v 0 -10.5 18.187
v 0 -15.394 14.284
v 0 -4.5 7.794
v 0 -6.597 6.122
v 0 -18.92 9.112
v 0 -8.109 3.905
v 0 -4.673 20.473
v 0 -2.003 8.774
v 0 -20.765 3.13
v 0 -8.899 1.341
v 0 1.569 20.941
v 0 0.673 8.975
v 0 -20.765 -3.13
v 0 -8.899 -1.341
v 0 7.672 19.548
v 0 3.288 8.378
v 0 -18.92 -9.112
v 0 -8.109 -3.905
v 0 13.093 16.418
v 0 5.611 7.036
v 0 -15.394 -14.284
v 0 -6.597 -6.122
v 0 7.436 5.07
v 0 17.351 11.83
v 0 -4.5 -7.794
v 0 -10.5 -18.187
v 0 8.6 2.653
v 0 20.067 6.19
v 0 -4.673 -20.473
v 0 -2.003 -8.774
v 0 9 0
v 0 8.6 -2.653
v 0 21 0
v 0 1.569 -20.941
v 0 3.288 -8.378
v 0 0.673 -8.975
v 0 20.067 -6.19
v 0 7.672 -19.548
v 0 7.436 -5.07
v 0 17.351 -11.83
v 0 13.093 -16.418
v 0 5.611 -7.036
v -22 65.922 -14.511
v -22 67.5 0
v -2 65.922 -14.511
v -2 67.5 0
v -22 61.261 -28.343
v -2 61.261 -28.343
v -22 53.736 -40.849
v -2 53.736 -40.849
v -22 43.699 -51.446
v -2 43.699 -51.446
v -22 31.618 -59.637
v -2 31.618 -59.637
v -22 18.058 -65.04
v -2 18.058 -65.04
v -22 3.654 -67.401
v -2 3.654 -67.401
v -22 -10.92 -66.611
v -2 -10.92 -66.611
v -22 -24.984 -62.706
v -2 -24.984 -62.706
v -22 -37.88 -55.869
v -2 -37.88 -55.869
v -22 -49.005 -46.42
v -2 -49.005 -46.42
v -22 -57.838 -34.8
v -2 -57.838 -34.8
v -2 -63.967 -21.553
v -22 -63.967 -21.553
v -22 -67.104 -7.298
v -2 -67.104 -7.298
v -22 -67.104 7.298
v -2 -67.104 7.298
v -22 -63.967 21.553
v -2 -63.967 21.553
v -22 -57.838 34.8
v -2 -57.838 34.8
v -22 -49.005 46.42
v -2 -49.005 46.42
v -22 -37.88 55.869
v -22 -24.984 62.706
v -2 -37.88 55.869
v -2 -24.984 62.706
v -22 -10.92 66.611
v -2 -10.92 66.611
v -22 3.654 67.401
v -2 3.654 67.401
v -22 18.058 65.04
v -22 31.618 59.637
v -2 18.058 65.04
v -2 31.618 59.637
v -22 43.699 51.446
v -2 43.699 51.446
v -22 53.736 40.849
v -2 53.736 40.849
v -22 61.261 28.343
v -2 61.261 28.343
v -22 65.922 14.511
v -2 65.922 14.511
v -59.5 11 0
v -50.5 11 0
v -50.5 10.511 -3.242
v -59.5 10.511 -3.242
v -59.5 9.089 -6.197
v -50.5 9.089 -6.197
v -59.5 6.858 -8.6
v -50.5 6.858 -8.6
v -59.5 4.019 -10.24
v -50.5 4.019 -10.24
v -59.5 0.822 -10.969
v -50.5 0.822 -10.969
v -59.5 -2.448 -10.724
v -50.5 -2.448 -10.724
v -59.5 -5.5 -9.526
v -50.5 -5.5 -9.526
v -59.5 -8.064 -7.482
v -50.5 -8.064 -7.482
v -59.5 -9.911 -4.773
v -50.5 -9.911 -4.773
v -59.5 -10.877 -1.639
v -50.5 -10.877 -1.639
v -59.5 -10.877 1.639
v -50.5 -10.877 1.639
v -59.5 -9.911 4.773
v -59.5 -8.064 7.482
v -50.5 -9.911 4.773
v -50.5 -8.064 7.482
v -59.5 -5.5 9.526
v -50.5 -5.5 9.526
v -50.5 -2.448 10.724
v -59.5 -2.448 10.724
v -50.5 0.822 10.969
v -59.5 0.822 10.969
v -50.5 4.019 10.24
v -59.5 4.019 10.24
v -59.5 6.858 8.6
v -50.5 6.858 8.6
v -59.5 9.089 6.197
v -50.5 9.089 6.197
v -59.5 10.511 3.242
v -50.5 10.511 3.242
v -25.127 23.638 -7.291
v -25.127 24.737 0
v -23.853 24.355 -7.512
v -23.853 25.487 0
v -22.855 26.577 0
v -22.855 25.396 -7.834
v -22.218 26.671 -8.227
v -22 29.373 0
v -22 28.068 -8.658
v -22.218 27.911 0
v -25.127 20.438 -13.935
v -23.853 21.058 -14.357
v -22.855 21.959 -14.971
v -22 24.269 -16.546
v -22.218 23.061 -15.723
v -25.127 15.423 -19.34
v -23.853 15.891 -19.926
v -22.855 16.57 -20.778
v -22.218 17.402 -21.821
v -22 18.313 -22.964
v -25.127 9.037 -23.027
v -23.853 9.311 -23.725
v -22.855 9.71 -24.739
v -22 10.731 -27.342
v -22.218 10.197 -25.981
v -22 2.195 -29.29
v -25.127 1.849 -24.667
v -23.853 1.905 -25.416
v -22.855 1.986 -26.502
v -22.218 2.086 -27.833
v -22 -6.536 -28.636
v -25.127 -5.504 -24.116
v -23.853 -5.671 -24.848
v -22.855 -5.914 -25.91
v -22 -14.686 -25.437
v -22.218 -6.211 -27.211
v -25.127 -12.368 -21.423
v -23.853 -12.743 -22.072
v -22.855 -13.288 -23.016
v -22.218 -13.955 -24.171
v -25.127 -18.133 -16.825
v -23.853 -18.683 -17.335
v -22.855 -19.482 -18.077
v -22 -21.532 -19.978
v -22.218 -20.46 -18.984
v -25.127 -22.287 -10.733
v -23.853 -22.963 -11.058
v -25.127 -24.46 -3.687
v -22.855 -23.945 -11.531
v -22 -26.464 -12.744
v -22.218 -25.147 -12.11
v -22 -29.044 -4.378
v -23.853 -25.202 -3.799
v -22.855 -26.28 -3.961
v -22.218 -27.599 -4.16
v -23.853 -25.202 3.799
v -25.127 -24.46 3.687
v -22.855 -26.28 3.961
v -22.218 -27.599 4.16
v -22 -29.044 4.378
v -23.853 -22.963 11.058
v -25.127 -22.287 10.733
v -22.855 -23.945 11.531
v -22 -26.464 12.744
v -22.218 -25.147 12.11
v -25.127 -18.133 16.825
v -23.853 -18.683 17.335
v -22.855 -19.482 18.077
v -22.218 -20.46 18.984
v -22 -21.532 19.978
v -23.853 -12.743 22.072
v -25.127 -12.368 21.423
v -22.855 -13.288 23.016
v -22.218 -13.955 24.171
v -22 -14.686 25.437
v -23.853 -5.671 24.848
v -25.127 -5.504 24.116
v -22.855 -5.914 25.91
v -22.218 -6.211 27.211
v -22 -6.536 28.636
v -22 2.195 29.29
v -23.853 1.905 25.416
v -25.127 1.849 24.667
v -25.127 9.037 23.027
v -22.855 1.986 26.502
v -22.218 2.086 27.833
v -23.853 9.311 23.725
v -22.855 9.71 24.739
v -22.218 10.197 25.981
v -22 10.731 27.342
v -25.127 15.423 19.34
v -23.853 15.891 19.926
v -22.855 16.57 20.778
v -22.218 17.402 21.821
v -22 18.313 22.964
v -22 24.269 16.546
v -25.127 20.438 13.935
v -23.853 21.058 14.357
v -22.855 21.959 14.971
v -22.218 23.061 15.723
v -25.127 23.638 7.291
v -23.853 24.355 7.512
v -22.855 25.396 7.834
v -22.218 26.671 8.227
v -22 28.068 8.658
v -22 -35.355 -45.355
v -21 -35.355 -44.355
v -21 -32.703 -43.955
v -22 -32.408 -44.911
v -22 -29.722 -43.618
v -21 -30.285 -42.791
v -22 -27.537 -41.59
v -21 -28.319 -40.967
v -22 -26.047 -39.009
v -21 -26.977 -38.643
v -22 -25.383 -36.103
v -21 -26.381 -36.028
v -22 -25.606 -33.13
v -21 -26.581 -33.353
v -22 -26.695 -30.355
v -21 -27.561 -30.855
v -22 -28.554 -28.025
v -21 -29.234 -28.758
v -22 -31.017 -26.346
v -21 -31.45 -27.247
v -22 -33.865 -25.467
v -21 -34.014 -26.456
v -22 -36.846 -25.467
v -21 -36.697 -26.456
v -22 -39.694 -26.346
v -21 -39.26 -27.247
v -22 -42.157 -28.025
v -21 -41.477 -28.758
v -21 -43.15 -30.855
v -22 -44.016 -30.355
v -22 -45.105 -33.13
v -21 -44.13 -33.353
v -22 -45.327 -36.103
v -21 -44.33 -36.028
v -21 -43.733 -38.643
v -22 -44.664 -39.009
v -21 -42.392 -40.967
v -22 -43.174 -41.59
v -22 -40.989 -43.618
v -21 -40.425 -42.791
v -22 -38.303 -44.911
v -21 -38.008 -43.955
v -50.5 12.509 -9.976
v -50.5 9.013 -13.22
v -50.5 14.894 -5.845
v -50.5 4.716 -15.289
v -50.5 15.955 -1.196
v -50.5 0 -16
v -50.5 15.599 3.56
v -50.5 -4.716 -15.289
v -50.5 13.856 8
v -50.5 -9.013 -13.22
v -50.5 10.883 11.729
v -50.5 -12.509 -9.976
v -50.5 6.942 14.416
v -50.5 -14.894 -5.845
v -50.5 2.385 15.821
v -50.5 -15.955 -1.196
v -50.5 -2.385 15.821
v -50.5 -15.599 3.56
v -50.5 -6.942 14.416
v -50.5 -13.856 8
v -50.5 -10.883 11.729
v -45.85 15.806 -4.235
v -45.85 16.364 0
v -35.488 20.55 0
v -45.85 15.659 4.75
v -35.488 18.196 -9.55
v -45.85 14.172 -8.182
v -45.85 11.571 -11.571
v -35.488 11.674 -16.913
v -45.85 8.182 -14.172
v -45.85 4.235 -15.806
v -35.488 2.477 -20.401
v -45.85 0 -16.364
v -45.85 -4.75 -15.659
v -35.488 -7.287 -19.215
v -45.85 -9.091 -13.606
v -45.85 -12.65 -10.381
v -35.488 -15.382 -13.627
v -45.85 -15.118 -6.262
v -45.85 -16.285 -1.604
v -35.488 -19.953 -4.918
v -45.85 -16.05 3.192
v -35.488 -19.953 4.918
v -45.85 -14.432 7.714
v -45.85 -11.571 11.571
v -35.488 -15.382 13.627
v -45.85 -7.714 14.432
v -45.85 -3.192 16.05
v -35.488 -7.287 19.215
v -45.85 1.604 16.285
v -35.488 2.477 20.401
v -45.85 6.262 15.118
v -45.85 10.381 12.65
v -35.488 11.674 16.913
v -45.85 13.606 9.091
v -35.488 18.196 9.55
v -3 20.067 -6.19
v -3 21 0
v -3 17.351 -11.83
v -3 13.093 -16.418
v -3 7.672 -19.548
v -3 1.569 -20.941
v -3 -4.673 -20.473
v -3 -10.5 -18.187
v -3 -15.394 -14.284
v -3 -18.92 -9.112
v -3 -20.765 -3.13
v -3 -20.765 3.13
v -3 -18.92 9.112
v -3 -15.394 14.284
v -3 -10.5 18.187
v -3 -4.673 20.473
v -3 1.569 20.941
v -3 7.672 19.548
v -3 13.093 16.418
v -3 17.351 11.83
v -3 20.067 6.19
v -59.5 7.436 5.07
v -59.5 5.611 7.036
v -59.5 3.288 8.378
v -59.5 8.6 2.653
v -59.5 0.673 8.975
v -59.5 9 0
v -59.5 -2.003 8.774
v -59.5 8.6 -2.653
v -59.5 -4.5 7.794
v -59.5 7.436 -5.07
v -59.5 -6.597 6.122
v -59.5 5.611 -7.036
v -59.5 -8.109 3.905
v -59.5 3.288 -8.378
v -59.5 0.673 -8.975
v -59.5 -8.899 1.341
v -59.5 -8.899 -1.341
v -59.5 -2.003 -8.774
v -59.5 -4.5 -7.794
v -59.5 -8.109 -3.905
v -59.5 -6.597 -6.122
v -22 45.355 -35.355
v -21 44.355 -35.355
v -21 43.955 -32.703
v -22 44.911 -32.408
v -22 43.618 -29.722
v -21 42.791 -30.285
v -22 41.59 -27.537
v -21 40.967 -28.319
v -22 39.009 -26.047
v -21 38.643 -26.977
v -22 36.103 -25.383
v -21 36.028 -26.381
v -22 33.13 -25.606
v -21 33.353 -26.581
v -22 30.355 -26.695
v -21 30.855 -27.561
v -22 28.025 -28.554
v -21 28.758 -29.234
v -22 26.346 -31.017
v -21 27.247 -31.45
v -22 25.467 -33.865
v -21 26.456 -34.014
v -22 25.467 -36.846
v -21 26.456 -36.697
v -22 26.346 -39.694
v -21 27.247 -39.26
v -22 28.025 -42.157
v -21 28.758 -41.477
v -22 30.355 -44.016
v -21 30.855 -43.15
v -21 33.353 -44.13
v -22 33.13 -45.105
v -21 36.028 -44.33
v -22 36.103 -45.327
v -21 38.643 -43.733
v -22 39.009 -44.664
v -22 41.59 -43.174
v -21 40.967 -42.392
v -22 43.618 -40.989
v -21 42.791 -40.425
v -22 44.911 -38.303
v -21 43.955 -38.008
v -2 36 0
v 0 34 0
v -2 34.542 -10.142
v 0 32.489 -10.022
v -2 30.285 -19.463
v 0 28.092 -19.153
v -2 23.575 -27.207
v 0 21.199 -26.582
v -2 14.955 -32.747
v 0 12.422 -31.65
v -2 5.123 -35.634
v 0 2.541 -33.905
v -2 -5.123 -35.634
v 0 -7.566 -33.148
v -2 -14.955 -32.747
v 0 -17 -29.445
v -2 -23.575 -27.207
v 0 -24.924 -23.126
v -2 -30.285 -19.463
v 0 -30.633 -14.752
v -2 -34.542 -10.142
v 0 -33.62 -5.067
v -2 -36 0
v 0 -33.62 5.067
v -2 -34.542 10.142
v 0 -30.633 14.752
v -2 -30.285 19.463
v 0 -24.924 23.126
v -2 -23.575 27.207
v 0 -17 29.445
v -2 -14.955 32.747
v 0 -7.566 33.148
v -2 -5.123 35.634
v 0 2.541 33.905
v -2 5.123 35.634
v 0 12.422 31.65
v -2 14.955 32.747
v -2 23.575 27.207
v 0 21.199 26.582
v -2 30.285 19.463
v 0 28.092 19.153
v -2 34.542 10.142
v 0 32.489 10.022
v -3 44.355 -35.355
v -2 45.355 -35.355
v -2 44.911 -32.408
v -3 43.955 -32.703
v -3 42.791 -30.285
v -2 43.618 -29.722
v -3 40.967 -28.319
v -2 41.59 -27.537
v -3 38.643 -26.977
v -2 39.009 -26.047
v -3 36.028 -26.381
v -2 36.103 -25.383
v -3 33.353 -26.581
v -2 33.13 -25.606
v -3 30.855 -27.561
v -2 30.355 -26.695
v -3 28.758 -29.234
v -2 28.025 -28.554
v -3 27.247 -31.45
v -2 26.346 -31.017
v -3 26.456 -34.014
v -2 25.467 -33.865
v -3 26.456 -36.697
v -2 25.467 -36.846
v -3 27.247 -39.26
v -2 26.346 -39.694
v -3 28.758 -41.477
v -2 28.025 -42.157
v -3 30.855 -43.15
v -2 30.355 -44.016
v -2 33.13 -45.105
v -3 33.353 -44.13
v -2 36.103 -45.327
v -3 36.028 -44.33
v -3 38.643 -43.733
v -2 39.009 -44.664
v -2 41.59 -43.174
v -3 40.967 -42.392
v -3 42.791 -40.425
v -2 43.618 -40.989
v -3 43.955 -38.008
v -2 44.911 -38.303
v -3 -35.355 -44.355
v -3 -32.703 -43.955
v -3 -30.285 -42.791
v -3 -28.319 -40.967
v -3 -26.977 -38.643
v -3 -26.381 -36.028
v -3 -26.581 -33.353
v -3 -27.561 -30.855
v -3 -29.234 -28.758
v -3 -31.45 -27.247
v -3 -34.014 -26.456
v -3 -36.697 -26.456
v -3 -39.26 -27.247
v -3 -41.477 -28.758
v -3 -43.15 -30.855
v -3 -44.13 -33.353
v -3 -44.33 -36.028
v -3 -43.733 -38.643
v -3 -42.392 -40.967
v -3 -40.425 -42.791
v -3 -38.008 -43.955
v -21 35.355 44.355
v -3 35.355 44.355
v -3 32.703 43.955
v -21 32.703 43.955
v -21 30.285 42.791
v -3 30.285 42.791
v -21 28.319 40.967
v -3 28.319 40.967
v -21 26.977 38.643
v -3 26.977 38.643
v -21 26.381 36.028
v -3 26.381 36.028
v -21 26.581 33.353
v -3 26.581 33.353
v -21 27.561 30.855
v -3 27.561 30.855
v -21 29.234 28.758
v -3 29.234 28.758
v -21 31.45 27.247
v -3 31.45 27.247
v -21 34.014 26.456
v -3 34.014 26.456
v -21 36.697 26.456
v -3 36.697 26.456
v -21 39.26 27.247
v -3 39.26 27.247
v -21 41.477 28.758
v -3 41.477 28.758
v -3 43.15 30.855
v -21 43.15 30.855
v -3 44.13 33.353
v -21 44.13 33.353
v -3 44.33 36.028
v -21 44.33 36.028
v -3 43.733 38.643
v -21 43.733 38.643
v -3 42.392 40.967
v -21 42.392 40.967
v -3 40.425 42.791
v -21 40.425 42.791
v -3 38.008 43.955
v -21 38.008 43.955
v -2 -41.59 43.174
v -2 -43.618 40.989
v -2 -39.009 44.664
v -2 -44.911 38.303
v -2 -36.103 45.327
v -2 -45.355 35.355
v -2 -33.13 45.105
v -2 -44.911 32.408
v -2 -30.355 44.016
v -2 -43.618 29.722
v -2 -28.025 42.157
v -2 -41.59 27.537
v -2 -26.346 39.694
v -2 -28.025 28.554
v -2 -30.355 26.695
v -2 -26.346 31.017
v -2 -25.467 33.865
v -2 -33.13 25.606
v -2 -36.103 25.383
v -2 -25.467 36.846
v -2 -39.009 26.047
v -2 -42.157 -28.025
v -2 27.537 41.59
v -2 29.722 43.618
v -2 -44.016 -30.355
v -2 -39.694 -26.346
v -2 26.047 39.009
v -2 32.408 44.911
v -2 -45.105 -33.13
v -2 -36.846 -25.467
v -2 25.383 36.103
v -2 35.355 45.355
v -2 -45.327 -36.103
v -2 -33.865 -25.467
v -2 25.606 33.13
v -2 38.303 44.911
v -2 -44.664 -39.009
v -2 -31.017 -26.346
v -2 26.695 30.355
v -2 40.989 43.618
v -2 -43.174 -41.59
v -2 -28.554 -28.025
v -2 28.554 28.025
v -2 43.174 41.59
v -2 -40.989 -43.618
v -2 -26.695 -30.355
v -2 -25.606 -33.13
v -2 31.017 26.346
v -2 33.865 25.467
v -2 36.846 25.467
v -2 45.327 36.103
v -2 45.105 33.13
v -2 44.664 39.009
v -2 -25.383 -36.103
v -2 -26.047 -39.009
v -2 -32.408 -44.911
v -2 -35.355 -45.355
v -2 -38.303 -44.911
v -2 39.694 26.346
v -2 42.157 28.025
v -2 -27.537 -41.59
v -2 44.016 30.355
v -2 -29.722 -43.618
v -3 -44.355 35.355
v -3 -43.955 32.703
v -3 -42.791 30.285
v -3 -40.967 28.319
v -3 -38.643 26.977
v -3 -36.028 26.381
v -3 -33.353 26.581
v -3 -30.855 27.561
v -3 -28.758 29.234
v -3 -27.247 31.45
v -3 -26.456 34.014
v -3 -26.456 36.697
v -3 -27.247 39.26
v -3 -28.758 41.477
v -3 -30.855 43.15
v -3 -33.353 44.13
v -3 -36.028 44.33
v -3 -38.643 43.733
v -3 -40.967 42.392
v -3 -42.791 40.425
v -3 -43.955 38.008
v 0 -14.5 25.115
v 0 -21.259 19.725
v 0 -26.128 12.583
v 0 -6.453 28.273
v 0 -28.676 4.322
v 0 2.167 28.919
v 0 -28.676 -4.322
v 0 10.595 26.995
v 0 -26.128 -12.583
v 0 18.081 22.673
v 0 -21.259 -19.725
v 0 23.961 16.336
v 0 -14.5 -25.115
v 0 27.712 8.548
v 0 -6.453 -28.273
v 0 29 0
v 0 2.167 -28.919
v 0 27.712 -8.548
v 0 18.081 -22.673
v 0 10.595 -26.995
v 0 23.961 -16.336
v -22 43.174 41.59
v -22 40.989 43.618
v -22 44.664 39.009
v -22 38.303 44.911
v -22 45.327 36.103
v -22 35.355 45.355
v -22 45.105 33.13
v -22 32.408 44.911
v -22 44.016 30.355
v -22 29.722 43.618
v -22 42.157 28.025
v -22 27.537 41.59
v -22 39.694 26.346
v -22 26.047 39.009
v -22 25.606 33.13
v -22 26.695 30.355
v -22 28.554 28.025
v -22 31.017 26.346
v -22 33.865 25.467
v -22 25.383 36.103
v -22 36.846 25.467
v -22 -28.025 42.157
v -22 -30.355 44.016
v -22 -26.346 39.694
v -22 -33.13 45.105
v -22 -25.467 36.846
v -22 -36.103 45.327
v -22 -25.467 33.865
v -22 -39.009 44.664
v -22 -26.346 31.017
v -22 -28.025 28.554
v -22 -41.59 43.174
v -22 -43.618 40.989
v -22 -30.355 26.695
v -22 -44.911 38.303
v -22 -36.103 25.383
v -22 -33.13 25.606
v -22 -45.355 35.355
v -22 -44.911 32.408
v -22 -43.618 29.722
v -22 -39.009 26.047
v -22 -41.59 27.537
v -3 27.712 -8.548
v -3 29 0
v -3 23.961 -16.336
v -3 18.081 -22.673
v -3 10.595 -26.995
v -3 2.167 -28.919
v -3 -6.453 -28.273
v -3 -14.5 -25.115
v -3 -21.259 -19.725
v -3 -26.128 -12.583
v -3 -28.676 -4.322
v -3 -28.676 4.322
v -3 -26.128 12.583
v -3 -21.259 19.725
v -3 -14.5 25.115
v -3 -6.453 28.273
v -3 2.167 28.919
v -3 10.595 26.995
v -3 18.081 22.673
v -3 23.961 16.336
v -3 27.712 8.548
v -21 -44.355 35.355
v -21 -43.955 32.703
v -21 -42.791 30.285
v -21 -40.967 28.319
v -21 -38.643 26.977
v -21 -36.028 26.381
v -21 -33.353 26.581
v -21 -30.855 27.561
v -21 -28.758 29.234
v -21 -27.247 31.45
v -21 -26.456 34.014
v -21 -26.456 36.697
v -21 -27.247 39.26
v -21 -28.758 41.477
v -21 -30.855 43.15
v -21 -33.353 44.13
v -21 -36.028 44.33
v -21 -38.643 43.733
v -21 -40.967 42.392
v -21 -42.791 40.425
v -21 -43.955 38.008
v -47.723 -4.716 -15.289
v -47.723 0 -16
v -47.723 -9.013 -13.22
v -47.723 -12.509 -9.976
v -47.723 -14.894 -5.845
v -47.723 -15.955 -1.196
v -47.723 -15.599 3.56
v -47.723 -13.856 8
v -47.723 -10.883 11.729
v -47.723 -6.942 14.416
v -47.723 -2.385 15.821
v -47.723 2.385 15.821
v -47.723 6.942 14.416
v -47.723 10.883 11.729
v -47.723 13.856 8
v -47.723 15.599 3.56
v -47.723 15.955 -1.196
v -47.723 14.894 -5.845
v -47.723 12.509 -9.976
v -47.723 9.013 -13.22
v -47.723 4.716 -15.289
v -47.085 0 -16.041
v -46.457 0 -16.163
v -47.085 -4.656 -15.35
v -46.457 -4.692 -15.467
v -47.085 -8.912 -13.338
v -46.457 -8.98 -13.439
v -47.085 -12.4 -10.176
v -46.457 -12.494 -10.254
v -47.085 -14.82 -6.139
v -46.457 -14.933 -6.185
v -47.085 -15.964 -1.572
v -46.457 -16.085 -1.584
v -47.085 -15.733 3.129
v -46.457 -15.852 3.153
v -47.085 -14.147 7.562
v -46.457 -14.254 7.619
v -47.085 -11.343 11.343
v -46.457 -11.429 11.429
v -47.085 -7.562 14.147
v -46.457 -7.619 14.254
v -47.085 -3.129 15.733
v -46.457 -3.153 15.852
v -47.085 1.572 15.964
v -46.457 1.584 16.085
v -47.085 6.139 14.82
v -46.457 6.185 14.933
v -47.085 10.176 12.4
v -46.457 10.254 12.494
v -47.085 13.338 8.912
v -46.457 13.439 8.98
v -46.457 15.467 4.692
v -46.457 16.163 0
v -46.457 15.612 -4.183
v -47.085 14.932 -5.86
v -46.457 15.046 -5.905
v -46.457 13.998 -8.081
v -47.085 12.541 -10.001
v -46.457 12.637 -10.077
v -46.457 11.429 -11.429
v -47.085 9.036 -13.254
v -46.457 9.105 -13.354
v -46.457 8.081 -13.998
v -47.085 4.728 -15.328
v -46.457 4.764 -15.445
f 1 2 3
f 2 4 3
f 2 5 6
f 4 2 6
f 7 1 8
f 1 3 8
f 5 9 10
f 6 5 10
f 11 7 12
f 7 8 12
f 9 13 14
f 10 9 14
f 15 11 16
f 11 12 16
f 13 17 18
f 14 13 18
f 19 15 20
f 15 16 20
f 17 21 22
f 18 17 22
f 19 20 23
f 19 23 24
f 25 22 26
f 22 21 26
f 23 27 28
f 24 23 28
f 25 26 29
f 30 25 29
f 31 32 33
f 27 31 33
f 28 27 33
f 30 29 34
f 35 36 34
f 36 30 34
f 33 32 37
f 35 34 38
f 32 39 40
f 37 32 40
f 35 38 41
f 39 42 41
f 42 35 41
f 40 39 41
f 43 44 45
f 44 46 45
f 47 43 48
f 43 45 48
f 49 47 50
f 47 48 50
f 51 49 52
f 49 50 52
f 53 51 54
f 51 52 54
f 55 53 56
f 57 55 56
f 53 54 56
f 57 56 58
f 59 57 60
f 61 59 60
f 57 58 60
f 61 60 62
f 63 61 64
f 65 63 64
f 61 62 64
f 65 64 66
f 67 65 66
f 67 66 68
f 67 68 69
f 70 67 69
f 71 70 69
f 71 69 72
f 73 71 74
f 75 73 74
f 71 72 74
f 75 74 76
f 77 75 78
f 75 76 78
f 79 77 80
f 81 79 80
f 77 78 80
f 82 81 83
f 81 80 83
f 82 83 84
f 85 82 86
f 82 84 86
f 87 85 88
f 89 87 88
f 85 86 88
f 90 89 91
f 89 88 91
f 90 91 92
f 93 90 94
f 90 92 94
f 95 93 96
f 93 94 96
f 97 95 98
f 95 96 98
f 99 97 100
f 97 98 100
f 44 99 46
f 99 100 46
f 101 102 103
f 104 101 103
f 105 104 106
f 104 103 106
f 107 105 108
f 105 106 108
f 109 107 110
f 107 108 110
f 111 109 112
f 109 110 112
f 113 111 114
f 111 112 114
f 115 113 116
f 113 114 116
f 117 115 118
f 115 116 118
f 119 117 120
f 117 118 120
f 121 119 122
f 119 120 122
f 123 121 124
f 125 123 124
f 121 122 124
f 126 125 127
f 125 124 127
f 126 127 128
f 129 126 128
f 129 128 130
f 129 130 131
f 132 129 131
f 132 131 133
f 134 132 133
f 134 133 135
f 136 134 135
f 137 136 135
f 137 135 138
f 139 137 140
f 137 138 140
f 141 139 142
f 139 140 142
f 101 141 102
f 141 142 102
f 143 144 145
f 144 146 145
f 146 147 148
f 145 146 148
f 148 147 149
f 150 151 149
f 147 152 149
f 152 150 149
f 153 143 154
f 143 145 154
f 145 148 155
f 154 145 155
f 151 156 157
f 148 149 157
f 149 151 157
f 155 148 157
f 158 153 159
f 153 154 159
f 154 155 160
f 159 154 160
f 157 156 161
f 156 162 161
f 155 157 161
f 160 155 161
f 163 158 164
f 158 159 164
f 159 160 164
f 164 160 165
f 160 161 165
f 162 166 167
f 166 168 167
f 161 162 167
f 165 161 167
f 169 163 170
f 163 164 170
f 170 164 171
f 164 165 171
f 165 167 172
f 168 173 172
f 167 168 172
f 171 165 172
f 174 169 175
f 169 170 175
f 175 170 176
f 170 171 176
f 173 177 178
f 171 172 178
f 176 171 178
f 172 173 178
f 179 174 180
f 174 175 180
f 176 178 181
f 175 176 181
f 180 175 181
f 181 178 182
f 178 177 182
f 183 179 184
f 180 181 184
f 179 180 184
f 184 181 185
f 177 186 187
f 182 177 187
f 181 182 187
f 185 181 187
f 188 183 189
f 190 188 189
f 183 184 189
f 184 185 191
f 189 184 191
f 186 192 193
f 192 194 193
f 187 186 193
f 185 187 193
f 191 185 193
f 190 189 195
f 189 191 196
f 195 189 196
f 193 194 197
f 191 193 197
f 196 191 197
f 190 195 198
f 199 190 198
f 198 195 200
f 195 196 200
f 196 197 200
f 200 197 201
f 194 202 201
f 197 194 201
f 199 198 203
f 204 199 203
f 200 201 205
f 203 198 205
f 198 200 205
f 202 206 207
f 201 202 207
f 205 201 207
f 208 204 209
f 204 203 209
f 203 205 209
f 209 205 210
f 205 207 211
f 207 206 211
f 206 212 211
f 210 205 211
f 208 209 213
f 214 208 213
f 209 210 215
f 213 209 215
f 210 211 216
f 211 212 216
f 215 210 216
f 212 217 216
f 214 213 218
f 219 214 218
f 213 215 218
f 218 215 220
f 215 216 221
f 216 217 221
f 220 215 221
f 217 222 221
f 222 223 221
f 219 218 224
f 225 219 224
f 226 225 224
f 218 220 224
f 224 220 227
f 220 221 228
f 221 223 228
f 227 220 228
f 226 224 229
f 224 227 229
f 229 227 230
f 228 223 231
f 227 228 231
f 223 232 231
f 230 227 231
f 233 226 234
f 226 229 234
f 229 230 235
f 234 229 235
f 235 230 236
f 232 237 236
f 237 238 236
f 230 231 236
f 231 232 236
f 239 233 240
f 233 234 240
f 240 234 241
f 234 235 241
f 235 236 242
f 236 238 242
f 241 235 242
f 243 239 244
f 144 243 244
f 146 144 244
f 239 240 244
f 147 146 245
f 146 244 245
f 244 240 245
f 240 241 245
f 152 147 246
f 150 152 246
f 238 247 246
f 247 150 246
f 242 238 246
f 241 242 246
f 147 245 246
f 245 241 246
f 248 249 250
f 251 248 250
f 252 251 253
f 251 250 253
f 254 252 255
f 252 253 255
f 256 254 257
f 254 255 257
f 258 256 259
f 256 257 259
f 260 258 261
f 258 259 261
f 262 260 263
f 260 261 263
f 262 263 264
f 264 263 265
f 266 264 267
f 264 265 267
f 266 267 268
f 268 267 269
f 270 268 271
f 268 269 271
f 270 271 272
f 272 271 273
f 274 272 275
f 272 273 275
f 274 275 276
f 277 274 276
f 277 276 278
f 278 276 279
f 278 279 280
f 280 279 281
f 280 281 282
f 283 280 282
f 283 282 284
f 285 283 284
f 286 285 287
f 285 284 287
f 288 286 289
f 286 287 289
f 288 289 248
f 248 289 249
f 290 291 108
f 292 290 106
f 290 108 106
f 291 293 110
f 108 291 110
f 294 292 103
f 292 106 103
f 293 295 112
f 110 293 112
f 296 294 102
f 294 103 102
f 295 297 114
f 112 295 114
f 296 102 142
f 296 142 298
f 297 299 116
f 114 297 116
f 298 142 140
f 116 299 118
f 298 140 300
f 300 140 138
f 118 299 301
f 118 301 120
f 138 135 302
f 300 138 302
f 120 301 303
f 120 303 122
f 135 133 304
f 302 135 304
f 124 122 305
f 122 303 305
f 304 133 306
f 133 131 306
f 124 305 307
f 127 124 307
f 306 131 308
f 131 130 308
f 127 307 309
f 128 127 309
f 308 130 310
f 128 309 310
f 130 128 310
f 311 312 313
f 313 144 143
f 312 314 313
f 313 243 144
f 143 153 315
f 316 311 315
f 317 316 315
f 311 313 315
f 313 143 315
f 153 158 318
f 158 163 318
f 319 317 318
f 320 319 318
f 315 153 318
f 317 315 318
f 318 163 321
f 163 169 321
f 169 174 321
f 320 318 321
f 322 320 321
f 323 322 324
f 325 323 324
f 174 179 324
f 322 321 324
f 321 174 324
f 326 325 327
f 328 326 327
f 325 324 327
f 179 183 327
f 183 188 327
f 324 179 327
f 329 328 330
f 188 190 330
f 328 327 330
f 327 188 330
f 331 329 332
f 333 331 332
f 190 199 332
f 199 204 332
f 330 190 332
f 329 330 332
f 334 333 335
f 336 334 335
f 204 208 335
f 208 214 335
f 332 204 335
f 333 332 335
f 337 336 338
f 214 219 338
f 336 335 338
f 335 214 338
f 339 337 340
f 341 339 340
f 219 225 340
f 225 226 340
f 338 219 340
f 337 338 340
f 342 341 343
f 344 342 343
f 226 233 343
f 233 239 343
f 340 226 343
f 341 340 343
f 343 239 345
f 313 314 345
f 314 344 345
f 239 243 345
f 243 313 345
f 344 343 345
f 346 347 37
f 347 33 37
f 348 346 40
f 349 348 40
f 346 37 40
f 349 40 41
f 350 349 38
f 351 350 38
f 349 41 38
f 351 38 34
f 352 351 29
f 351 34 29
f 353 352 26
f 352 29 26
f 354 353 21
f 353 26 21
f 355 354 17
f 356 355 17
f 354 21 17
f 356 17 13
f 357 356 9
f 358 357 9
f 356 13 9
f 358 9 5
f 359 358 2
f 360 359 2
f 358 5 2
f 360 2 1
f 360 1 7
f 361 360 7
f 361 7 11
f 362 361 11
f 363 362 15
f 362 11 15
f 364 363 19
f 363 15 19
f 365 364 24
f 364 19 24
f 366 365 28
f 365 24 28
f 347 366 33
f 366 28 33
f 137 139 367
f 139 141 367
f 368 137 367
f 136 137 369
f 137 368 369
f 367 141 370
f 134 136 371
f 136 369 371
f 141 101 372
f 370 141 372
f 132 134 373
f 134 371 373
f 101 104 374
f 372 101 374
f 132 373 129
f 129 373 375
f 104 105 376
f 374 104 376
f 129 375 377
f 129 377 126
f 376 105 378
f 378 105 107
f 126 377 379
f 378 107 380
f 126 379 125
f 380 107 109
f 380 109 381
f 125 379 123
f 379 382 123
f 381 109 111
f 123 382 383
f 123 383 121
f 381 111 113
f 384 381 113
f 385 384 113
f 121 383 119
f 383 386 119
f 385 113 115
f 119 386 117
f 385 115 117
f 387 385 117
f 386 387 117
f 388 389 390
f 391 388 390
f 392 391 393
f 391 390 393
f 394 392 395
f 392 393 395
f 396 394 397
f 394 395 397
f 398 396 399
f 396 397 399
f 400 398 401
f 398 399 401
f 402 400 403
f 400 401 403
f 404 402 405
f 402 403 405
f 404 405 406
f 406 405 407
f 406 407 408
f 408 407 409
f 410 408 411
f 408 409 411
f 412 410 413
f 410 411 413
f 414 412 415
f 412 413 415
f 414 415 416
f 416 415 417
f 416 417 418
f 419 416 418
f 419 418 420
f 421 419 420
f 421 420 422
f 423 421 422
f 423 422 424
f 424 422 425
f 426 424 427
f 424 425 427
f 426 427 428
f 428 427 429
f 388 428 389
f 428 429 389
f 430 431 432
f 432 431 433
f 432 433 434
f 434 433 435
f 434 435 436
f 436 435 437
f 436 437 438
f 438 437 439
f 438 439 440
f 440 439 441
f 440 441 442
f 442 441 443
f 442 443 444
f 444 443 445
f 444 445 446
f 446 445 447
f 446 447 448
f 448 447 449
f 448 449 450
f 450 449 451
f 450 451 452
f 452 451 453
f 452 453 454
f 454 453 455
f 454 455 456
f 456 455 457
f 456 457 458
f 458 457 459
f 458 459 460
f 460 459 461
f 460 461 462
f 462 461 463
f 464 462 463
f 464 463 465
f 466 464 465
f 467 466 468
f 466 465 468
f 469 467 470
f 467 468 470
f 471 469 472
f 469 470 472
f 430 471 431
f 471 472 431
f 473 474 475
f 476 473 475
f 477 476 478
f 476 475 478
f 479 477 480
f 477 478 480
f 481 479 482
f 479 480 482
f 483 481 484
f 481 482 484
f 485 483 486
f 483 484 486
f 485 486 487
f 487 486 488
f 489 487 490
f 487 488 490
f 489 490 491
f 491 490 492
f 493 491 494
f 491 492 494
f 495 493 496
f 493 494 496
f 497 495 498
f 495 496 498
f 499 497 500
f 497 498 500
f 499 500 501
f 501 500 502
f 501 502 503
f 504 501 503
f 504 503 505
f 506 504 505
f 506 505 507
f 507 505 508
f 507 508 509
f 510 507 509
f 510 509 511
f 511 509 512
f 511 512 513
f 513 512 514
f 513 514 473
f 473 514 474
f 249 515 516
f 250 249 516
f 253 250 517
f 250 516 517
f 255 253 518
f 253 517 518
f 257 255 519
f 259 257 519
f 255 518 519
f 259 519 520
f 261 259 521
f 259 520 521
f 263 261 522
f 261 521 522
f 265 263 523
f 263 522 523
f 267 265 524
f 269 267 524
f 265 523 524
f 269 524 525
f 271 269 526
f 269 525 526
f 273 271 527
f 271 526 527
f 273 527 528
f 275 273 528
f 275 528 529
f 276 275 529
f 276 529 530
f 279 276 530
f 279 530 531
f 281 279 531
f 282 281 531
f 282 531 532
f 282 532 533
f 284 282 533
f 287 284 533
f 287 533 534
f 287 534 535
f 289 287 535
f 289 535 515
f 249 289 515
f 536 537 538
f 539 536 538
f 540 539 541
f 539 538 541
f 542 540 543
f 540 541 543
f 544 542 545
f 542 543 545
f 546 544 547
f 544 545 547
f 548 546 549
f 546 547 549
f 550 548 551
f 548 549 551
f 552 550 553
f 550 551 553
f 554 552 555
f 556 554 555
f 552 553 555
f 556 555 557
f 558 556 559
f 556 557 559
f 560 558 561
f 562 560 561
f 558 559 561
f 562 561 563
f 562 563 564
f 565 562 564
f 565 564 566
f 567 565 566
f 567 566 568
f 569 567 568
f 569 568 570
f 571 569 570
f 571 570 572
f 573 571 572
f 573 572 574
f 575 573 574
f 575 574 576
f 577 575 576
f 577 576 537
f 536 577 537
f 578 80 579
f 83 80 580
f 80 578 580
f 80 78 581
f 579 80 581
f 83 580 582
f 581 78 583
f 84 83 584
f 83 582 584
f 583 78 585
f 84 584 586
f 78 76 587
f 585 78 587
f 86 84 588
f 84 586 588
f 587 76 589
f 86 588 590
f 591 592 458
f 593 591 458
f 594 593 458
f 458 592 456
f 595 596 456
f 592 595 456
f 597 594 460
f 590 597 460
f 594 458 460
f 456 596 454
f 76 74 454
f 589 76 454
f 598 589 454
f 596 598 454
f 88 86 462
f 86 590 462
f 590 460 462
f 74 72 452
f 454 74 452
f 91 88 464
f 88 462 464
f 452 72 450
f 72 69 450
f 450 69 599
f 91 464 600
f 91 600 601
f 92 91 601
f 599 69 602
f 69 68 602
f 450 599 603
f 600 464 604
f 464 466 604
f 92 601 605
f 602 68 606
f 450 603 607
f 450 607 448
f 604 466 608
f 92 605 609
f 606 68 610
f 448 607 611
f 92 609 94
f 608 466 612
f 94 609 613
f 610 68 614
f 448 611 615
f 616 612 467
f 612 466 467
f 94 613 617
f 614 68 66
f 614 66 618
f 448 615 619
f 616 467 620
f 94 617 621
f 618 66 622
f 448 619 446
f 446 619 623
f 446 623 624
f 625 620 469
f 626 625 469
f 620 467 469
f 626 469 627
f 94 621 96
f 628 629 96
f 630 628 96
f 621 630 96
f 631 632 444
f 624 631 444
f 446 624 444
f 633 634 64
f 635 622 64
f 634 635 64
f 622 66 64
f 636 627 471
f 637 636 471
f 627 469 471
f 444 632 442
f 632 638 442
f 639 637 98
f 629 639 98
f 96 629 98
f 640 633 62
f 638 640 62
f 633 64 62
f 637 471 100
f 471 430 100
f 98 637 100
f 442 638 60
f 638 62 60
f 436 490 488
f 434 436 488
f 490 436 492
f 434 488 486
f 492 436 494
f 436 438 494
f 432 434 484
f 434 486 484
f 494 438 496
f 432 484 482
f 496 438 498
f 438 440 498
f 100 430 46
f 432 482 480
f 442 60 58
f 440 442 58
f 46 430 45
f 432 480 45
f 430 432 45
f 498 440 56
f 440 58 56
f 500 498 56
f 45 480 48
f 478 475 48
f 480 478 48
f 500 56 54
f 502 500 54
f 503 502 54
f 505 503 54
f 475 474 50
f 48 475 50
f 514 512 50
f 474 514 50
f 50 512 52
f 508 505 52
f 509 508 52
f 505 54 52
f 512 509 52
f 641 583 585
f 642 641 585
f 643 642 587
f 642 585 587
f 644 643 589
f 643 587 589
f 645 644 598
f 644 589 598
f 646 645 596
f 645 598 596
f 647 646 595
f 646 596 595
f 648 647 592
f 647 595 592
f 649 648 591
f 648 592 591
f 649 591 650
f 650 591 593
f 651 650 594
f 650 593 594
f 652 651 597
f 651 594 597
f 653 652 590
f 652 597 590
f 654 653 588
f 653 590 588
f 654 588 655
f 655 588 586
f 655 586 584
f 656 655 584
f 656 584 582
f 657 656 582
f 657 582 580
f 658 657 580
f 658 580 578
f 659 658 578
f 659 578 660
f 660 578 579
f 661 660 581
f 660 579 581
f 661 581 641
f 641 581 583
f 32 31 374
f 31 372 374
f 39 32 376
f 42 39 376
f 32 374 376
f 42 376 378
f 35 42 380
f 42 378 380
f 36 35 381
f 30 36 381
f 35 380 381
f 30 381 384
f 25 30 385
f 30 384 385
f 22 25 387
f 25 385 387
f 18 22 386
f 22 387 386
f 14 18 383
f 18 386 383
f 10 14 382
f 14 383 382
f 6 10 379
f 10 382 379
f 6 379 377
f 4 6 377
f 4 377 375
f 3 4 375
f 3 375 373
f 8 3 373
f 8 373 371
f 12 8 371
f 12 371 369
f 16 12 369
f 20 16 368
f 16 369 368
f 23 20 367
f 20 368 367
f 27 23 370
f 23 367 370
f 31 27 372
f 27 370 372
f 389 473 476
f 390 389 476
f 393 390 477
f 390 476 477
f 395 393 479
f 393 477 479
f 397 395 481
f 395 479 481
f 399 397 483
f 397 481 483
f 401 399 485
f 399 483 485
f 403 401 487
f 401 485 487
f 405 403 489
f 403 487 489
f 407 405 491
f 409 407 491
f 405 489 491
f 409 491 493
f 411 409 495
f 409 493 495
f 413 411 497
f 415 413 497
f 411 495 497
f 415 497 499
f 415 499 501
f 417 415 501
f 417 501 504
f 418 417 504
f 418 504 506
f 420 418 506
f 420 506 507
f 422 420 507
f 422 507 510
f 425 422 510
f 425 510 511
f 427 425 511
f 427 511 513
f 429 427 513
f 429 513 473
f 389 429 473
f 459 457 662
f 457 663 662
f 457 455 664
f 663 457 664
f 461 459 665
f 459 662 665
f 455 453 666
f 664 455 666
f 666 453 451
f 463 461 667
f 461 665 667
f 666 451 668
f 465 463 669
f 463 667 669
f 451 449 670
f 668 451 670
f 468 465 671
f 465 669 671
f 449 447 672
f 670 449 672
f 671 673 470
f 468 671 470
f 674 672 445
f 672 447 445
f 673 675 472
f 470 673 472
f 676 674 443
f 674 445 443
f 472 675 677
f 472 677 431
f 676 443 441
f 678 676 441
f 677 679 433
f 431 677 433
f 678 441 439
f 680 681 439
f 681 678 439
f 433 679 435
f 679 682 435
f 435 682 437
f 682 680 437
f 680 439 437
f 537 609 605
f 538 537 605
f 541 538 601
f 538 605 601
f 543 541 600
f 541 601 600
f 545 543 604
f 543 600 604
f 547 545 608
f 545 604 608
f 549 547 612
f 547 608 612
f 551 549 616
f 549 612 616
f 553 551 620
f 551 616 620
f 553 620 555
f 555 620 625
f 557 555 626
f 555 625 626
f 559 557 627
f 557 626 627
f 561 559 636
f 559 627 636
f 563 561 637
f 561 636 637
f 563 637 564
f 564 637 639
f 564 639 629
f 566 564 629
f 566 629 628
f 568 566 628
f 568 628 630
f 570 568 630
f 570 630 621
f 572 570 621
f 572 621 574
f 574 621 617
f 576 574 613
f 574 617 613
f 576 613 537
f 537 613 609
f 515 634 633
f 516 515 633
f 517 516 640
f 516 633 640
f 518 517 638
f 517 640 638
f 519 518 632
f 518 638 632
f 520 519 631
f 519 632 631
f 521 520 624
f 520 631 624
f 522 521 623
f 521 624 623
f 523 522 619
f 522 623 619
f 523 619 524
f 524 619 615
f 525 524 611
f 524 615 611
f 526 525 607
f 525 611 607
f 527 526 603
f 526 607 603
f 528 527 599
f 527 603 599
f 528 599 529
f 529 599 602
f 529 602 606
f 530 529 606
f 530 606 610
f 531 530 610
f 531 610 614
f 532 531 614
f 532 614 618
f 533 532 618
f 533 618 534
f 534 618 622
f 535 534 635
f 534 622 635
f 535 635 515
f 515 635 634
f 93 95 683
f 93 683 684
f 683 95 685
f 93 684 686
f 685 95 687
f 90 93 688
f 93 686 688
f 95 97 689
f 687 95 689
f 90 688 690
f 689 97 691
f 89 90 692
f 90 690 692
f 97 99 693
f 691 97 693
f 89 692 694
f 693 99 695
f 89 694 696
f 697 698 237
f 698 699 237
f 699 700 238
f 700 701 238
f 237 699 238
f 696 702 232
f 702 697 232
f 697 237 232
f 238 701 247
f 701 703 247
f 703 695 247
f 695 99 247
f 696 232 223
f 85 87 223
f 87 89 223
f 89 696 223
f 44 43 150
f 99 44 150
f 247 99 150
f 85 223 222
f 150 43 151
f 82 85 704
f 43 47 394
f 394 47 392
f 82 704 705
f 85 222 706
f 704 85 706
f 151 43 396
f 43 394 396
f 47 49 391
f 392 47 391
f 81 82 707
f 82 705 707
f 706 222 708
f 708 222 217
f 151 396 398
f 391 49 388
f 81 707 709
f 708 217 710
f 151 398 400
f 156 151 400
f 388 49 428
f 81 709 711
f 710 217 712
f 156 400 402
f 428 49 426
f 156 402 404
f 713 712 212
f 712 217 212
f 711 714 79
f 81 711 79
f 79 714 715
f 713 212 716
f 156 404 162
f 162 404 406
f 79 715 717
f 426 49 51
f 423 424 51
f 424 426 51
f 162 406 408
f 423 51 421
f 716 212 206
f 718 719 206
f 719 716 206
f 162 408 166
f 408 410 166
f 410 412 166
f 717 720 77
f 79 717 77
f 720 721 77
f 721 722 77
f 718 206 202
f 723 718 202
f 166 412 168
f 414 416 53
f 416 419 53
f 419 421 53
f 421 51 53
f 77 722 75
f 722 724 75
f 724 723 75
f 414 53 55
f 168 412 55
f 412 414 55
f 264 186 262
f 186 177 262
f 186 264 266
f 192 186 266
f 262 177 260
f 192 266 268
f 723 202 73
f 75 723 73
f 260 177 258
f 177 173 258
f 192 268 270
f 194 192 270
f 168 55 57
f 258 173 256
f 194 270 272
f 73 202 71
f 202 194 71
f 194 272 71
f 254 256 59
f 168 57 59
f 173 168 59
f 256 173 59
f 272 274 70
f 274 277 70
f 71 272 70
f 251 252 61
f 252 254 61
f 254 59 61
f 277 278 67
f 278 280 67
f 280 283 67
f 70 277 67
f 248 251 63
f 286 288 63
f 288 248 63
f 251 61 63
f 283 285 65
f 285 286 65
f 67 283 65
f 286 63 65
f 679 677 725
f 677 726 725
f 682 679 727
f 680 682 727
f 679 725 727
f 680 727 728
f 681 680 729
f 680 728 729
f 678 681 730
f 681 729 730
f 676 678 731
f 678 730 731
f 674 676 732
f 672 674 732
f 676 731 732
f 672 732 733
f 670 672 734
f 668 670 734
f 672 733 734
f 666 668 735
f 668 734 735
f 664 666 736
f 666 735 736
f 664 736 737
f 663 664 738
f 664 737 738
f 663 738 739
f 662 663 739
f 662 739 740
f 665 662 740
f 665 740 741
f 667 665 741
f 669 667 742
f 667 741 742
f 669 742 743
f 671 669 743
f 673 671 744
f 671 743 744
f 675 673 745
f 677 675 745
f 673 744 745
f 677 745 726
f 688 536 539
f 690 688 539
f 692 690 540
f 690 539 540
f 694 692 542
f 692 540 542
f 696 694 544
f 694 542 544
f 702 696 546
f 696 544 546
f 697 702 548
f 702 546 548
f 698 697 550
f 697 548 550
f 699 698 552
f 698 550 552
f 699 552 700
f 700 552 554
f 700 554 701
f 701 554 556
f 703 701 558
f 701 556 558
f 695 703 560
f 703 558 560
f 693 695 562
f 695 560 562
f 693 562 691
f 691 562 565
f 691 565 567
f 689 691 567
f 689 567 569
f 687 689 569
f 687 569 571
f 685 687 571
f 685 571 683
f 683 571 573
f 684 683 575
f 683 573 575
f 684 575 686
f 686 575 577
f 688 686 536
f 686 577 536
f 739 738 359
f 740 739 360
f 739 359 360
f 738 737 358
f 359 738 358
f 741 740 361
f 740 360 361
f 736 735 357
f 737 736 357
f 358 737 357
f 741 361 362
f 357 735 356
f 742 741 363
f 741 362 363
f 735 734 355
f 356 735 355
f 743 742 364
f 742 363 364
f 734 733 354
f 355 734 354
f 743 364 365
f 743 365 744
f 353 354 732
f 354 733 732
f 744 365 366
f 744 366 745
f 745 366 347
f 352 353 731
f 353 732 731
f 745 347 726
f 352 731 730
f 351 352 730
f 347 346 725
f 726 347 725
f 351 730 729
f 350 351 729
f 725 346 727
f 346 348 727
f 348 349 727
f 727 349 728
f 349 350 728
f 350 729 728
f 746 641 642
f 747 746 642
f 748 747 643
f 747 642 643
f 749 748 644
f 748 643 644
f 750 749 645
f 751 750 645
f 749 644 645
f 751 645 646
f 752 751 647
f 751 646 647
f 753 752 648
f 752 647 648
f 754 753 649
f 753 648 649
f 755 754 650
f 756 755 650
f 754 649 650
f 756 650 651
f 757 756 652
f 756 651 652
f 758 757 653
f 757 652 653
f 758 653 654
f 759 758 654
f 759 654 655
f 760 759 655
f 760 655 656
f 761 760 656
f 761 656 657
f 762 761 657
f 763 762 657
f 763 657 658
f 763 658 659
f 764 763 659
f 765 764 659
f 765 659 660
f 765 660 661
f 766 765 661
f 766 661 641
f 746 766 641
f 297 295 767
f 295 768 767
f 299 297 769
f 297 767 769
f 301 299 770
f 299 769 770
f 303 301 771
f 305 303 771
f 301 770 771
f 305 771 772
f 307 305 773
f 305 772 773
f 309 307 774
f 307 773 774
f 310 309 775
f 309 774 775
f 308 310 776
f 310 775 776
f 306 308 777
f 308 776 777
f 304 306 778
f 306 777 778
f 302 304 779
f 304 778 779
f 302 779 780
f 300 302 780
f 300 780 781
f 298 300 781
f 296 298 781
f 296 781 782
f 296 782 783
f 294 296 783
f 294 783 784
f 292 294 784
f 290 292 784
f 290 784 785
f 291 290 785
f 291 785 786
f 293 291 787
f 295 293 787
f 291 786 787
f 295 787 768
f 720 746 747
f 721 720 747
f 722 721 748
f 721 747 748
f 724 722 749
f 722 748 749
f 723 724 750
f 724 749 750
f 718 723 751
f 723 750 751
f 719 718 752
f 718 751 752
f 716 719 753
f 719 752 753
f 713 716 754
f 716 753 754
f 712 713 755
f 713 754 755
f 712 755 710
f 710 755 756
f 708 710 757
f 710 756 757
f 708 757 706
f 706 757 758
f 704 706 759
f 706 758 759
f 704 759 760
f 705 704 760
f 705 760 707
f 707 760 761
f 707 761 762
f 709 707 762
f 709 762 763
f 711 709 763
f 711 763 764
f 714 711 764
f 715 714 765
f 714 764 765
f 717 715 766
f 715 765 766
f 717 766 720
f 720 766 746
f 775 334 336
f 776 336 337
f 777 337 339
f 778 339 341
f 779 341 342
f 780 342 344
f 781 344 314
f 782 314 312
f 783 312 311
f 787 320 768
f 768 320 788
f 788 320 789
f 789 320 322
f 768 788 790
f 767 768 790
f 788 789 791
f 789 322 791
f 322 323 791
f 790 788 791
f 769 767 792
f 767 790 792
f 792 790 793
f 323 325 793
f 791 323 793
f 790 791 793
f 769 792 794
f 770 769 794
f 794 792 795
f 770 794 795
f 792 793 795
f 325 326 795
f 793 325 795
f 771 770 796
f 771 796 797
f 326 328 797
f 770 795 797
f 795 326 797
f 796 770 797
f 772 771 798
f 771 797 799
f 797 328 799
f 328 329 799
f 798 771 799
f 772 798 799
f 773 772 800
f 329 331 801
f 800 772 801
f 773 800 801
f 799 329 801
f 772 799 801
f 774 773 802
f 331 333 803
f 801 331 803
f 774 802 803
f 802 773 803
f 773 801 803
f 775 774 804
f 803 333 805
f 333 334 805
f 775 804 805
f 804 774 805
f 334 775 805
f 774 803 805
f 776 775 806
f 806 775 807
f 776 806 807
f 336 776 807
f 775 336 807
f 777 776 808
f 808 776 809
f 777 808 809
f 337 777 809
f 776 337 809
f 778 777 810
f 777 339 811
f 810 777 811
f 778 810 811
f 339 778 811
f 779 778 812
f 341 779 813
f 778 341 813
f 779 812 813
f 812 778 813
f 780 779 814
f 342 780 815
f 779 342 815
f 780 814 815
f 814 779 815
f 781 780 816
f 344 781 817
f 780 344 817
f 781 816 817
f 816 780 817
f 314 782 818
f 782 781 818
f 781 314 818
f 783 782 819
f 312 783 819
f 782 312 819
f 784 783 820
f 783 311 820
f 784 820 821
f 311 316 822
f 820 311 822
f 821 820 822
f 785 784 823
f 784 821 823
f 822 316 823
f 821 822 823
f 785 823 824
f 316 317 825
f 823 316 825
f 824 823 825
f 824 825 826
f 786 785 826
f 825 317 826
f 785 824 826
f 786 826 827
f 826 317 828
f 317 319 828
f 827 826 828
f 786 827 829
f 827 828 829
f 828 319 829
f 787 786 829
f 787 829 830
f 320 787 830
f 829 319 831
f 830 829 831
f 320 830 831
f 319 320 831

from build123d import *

# Parameters (mm, degrees)
SKETCH_3_R                           = 9.000000000000004
CUT_EXTRUDE_1_DEPTH                  = 112.43944544011336
CHAMFER_1_SIZE                       = 1
PATTERN_CIRCULAR_1_COUNT             = 4
CHAMFER_1_OF_PATTERN_CIRCULAR_1_SIZE = 1


with BuildPart() as part:
    # Эскиз1 → Повернуть1 (revolve)
    with BuildSketch(Plane.XY):
        with BuildLine():
            Line((3.06e-15, 9), (-59.50000000000001, 8.999999999999993))
            Line((-59.50000000000001, 8.999999999999993), (-59.50000000000001, 10.999999999999996))
            Line((-59.50000000000001, 10.999999999999996), (-50.5, 10.999999999999995))
            Line((-50.5, 10.999999999999995), (-47.09683777000456, 15.860219355388013))
            Line((-47.09683777000456, 15.860219355388013), (-25.126967032920497, 24.736623311378192))
            ThreePointArc((-25.126967032920497, 24.736623311378192), (-22.85481213722481, 26.576578066858403), (-22.000000000000007, 29.372542584212177))
            Line((-22.000000000000007, 29.372542584212177), (-22.000000000000007, 67.5))
            Line((-22.000000000000007, 67.5), (-2.0000000000000053, 67.5))
            Line((-2.0000000000000053, 67.5), (-2.0000000000000004, 36.00000000000003))
            Line((-2.0000000000000004, 36.00000000000003), (-6.7e-16, 34))
            Line((-6.7e-16, 34), (6.1e-16, 29))
            Line((6.1e-16, 29), (-2.999999999999999, 29))
            Line((-2.999999999999999, 29), (-2.9999999999999982, 21))
            Line((-2.9999999999999982, 21), (1.73e-15, 21))
            Line((1.73e-15, 21), (3.06e-15, 9))
        make_face()
    revolve(axis=Axis((0, 0, 0), (-1, -1.2e-16, 0)))

    # Эскиз2 → Повернуть2 (revolve)
    with BuildSketch(Plane.XY, mode=Mode.PRIVATE) as revolve_2_sk:
        with BuildLine():
            Line((-47.09683777000456, 15.86021935538801), (-50.5, 10.999999999999991))
            Line((-50.5, 10.999999999999991), (-50.5, 15.999999999999993))
            Line((-50.5, 15.999999999999993), (-47.722770079851955, 15.999999999999993))
            ThreePointArc((-47.722770079851955, 15.999999999999993), (-46.76872510296925, 16.09186408276167), (-45.849737112772424, 16.364080727166044))
            Line((-45.849737112772424, 16.364080727166044), (-47.09683777000456, 15.86021935538801))
        make_face()
    revolve(revolve_2_sk.sketch.rotate(Axis((0, 0, 0), (-1, 0, 0)), 90), axis=Axis((0, 0, 0), (-1, 0, 0)))

    # Эскиз3 → Вырез-Вытянуть1 (cut, through all)
    with BuildSketch(Plane(origin=(-1.9999999999999962, -2.4e-16, 0), x_dir=(0, 0, -1), z_dir=(1, 1.2e-16, 0))):
        with Locations(Location((35.35533905932718, 35.35533905932757, 0), (0, 0, 90))):
            Circle(SKETCH_3_R)
    cut_extrude_1 = extrude(amount=-CUT_EXTRUDE_1_DEPTH, mode=Mode.SUBTRACT)

    # Фаска1
    chamfer_1_edges = [part.edges().sort_by_distance(p)[0] for p in [
        (-22.000000000000007, 26.355339059327566, -35.35533905932718),
        (-1.9999999999999996, 26.355339059327566, -35.35533905932718),
    ]]
    chamfer(chamfer_1_edges, length=CHAMFER_1_SIZE)

    # Круговой массив1: Вырез-Вытянуть1 ×4 about axis
    pattern_circular_1_axis = Axis((0, 6.014e-14, 6.245e-14), (1, 0, 0))
    for i in range(1, PATTERN_CIRCULAR_1_COUNT):
        add(cut_extrude_1.rotate(pattern_circular_1_axis, i * 360 / PATTERN_CIRCULAR_1_COUNT), mode=Mode.SUBTRACT)

    # Фаска1 of Круговой массив1
    chamfer_1_of_pattern_circular_1_edges = [part.edges().sort_by_distance(p)[0] for p in [
        (-22.000000000000007, 35.3553390593273, 26.355339059327566),
        (-1.9999999999999996, 35.3553390593273, 26.355339059327566),
        (-22.000000000000007, -26.35533905932744, 35.35533905932731),
        (-1.9999999999999996, -26.35533905932744, 35.35533905932731),
        (-22.000000000000007, -35.355339059327186, -26.355339059327434),
        (-1.9999999999999996, -35.355339059327186, -26.355339059327434),
    ]]
    chamfer(chamfer_1_of_pattern_circular_1_edges, length=CHAMFER_1_OF_PATTERN_CIRCULAR_1_SIZE)


solid = part.part
